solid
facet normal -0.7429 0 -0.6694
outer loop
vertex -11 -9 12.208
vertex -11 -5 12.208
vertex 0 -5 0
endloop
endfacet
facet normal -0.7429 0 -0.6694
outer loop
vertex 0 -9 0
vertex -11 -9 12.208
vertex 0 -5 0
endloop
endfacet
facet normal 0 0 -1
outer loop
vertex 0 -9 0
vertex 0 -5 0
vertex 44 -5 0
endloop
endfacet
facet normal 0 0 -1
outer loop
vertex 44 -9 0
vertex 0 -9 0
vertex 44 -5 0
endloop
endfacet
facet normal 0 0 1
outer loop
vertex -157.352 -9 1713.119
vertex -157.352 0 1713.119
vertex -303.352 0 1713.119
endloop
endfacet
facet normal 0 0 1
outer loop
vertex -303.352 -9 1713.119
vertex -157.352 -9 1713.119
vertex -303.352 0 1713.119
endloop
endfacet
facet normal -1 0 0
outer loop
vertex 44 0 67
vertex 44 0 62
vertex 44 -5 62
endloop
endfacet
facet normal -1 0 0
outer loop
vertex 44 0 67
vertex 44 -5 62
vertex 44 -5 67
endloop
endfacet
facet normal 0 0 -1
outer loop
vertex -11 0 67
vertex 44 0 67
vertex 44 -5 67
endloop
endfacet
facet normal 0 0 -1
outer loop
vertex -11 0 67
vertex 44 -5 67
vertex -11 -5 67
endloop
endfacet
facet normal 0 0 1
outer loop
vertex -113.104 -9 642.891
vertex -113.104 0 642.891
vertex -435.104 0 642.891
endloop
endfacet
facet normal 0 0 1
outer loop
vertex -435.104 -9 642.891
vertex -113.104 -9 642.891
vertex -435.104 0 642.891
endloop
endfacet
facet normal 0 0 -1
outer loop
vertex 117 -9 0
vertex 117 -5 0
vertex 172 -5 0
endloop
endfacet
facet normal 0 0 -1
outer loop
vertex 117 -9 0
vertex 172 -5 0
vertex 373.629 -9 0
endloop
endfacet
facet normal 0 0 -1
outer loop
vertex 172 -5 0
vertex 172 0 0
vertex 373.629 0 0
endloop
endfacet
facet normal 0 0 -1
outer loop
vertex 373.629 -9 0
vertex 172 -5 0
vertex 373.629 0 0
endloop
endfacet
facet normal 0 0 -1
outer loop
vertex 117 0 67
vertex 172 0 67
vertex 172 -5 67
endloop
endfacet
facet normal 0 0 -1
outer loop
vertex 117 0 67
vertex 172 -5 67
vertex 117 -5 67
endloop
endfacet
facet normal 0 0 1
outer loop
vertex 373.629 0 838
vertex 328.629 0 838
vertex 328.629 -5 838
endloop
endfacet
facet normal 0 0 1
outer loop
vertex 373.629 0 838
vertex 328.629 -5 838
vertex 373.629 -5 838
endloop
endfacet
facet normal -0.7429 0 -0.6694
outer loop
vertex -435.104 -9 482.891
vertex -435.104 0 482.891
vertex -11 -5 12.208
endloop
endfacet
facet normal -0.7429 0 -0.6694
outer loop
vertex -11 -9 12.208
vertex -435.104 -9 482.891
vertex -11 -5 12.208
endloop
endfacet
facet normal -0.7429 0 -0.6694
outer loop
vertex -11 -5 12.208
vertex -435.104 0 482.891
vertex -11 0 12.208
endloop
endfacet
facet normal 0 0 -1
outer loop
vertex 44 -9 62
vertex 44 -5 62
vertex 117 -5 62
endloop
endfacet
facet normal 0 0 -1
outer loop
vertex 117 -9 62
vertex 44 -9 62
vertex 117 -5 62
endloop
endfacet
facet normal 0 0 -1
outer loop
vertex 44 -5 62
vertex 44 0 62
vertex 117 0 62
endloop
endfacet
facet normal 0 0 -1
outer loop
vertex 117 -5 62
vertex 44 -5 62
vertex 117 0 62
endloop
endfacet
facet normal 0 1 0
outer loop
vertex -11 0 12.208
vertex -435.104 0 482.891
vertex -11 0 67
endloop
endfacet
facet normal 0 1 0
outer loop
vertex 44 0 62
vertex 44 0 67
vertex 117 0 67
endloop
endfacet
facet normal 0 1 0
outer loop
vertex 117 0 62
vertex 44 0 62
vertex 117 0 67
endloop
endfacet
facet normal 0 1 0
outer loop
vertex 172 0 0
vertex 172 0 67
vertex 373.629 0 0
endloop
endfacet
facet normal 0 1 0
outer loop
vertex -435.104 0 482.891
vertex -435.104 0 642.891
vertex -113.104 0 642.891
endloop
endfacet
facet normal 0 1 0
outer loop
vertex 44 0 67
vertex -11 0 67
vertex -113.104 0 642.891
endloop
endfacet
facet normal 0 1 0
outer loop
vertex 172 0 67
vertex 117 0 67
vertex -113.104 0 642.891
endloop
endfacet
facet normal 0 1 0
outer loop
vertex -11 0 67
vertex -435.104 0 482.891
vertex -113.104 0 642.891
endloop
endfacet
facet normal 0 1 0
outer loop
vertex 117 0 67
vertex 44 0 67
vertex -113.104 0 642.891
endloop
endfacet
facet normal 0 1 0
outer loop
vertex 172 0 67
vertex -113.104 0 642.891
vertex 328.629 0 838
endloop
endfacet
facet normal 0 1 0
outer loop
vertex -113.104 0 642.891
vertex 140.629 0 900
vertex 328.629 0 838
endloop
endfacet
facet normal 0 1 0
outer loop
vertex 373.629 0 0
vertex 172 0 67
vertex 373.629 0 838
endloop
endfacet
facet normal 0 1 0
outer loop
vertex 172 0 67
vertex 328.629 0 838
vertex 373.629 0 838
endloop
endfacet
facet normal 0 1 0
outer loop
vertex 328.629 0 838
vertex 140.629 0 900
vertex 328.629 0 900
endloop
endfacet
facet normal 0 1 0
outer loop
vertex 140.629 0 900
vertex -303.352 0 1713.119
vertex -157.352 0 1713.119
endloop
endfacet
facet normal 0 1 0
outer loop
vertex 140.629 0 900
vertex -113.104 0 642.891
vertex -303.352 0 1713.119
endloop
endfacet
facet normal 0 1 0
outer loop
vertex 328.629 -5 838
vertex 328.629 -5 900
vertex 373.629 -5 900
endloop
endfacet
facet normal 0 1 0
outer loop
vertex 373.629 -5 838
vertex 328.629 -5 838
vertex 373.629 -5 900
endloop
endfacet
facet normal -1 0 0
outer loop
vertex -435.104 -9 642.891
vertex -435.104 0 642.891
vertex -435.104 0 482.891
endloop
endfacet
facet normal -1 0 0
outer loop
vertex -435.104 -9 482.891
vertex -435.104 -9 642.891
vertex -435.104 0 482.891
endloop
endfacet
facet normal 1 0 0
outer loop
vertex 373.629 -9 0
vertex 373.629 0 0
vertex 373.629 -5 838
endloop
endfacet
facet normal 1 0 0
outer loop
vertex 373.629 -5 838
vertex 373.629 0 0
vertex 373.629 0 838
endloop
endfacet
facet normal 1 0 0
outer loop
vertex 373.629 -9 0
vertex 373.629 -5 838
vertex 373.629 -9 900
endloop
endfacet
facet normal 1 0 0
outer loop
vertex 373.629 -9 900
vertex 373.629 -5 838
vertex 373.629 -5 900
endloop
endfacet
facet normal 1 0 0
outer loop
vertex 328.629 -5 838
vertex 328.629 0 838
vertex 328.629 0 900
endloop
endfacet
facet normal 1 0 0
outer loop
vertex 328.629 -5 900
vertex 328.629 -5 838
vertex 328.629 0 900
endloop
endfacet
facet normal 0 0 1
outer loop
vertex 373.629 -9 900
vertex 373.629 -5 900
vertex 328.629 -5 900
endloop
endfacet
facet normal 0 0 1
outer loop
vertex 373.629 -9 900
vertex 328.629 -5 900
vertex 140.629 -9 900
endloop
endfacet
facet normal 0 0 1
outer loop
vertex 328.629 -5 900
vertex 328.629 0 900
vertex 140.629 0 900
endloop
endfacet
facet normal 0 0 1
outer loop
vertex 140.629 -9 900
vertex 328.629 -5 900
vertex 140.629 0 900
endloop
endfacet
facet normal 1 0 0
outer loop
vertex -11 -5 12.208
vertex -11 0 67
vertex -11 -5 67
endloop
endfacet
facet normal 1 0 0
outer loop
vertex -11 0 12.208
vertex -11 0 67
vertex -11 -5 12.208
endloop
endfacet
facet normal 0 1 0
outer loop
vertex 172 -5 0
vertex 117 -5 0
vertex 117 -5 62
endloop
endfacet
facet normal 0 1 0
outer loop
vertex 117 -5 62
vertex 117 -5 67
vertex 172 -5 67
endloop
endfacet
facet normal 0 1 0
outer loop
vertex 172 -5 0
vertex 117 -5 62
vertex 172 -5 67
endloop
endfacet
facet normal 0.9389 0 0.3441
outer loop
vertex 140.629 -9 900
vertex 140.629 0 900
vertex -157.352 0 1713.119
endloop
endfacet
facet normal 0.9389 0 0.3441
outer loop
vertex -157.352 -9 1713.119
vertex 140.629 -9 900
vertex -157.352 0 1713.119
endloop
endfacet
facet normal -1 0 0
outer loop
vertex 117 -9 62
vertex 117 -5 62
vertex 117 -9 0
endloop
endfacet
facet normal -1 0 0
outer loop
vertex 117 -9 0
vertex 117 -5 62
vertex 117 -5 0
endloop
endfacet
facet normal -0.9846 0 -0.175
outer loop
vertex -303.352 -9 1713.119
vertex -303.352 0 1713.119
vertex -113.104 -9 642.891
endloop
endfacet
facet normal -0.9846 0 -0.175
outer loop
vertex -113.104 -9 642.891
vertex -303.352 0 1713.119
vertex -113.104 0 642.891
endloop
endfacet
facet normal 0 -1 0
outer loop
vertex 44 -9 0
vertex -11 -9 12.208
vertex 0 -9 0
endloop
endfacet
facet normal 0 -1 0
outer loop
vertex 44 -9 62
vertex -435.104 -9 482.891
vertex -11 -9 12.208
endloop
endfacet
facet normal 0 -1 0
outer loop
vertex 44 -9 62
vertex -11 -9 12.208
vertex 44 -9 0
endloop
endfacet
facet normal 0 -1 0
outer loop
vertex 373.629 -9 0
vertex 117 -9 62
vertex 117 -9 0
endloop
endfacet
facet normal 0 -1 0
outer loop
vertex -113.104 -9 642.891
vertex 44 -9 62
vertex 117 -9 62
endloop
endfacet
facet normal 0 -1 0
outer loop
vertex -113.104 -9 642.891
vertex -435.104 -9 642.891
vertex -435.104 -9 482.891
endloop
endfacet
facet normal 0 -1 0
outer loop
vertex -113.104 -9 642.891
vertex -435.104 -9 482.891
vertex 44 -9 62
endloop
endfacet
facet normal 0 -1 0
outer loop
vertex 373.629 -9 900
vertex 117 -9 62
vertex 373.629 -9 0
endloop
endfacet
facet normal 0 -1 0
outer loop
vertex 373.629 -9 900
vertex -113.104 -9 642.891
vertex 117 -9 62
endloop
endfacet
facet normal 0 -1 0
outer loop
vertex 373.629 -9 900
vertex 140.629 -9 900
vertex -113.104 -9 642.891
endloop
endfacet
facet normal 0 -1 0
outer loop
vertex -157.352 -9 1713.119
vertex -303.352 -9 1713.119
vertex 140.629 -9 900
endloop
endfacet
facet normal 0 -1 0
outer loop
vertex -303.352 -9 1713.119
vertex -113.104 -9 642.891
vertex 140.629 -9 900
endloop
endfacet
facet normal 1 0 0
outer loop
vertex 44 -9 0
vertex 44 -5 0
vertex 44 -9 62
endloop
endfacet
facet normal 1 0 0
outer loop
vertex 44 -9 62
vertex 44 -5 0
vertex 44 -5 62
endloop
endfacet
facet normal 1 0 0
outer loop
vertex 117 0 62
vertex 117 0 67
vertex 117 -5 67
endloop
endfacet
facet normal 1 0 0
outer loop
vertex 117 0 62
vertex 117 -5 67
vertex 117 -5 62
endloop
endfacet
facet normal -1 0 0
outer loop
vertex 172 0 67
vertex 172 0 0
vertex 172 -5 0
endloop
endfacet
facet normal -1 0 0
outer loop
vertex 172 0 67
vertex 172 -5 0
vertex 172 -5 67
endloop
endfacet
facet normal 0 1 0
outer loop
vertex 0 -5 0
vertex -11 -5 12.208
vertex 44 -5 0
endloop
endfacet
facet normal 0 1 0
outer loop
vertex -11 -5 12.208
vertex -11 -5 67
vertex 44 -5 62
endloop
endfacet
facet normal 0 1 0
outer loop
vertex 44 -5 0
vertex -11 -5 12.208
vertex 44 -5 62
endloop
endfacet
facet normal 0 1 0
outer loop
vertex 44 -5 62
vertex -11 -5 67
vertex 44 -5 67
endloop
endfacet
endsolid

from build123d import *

# Parameters (mm, degrees)
F0_W     = 45
F0_H     = 62
F1_DEPTH = 9
F2_DEPTH = 5


with BuildPart() as f1:
    # F0 (on Front) → F1 (new body)
    with BuildSketch(Plane.XZ):
        Polygon((-435.104496, 482.891372), (-11, 12.208114), (-11, 67), (44, 67), (44, 62), (117, 62), (117, 67), (172, 67), (172, 0), (373.629411, 0), (373.629411, 838), (328.629411, 838), (328.629411, 900), (140.629411, 900), (-157.3519, 1713.119388), (-303.3519, 1713.119388), (-113.104496, 642.891372), (-435.104496, 642.891372), align=None)
        Polygon((-11, 12.208114), (0, 0), (44, 0), (44, 62), (44, 67), (-11, 67), align=None)
        Polygon((117, 67), (117, 62), (117, 0), (172, 0), (172, 67), align=None)
        with Locations((351.129411, 869)):
            Rectangle(F0_W, F0_H)
    extrude(amount=F1_DEPTH)

    # F0 (on Front) → F2 (cut)
    with BuildSketch(Plane.XZ):
        with Locations((351.129411, 869)):
            Rectangle(F0_W, F0_H)
        Polygon((-11, 12.208114), (0, 0), (44, 0), (44, 62), (44, 67), (-11, 67), align=None)
        Polygon((117, 67), (117, 62), (117, 0), (172, 0), (172, 67), align=None)
    extrude(amount=F2_DEPTH, mode=Mode.SUBTRACT)


solid = f1.part
